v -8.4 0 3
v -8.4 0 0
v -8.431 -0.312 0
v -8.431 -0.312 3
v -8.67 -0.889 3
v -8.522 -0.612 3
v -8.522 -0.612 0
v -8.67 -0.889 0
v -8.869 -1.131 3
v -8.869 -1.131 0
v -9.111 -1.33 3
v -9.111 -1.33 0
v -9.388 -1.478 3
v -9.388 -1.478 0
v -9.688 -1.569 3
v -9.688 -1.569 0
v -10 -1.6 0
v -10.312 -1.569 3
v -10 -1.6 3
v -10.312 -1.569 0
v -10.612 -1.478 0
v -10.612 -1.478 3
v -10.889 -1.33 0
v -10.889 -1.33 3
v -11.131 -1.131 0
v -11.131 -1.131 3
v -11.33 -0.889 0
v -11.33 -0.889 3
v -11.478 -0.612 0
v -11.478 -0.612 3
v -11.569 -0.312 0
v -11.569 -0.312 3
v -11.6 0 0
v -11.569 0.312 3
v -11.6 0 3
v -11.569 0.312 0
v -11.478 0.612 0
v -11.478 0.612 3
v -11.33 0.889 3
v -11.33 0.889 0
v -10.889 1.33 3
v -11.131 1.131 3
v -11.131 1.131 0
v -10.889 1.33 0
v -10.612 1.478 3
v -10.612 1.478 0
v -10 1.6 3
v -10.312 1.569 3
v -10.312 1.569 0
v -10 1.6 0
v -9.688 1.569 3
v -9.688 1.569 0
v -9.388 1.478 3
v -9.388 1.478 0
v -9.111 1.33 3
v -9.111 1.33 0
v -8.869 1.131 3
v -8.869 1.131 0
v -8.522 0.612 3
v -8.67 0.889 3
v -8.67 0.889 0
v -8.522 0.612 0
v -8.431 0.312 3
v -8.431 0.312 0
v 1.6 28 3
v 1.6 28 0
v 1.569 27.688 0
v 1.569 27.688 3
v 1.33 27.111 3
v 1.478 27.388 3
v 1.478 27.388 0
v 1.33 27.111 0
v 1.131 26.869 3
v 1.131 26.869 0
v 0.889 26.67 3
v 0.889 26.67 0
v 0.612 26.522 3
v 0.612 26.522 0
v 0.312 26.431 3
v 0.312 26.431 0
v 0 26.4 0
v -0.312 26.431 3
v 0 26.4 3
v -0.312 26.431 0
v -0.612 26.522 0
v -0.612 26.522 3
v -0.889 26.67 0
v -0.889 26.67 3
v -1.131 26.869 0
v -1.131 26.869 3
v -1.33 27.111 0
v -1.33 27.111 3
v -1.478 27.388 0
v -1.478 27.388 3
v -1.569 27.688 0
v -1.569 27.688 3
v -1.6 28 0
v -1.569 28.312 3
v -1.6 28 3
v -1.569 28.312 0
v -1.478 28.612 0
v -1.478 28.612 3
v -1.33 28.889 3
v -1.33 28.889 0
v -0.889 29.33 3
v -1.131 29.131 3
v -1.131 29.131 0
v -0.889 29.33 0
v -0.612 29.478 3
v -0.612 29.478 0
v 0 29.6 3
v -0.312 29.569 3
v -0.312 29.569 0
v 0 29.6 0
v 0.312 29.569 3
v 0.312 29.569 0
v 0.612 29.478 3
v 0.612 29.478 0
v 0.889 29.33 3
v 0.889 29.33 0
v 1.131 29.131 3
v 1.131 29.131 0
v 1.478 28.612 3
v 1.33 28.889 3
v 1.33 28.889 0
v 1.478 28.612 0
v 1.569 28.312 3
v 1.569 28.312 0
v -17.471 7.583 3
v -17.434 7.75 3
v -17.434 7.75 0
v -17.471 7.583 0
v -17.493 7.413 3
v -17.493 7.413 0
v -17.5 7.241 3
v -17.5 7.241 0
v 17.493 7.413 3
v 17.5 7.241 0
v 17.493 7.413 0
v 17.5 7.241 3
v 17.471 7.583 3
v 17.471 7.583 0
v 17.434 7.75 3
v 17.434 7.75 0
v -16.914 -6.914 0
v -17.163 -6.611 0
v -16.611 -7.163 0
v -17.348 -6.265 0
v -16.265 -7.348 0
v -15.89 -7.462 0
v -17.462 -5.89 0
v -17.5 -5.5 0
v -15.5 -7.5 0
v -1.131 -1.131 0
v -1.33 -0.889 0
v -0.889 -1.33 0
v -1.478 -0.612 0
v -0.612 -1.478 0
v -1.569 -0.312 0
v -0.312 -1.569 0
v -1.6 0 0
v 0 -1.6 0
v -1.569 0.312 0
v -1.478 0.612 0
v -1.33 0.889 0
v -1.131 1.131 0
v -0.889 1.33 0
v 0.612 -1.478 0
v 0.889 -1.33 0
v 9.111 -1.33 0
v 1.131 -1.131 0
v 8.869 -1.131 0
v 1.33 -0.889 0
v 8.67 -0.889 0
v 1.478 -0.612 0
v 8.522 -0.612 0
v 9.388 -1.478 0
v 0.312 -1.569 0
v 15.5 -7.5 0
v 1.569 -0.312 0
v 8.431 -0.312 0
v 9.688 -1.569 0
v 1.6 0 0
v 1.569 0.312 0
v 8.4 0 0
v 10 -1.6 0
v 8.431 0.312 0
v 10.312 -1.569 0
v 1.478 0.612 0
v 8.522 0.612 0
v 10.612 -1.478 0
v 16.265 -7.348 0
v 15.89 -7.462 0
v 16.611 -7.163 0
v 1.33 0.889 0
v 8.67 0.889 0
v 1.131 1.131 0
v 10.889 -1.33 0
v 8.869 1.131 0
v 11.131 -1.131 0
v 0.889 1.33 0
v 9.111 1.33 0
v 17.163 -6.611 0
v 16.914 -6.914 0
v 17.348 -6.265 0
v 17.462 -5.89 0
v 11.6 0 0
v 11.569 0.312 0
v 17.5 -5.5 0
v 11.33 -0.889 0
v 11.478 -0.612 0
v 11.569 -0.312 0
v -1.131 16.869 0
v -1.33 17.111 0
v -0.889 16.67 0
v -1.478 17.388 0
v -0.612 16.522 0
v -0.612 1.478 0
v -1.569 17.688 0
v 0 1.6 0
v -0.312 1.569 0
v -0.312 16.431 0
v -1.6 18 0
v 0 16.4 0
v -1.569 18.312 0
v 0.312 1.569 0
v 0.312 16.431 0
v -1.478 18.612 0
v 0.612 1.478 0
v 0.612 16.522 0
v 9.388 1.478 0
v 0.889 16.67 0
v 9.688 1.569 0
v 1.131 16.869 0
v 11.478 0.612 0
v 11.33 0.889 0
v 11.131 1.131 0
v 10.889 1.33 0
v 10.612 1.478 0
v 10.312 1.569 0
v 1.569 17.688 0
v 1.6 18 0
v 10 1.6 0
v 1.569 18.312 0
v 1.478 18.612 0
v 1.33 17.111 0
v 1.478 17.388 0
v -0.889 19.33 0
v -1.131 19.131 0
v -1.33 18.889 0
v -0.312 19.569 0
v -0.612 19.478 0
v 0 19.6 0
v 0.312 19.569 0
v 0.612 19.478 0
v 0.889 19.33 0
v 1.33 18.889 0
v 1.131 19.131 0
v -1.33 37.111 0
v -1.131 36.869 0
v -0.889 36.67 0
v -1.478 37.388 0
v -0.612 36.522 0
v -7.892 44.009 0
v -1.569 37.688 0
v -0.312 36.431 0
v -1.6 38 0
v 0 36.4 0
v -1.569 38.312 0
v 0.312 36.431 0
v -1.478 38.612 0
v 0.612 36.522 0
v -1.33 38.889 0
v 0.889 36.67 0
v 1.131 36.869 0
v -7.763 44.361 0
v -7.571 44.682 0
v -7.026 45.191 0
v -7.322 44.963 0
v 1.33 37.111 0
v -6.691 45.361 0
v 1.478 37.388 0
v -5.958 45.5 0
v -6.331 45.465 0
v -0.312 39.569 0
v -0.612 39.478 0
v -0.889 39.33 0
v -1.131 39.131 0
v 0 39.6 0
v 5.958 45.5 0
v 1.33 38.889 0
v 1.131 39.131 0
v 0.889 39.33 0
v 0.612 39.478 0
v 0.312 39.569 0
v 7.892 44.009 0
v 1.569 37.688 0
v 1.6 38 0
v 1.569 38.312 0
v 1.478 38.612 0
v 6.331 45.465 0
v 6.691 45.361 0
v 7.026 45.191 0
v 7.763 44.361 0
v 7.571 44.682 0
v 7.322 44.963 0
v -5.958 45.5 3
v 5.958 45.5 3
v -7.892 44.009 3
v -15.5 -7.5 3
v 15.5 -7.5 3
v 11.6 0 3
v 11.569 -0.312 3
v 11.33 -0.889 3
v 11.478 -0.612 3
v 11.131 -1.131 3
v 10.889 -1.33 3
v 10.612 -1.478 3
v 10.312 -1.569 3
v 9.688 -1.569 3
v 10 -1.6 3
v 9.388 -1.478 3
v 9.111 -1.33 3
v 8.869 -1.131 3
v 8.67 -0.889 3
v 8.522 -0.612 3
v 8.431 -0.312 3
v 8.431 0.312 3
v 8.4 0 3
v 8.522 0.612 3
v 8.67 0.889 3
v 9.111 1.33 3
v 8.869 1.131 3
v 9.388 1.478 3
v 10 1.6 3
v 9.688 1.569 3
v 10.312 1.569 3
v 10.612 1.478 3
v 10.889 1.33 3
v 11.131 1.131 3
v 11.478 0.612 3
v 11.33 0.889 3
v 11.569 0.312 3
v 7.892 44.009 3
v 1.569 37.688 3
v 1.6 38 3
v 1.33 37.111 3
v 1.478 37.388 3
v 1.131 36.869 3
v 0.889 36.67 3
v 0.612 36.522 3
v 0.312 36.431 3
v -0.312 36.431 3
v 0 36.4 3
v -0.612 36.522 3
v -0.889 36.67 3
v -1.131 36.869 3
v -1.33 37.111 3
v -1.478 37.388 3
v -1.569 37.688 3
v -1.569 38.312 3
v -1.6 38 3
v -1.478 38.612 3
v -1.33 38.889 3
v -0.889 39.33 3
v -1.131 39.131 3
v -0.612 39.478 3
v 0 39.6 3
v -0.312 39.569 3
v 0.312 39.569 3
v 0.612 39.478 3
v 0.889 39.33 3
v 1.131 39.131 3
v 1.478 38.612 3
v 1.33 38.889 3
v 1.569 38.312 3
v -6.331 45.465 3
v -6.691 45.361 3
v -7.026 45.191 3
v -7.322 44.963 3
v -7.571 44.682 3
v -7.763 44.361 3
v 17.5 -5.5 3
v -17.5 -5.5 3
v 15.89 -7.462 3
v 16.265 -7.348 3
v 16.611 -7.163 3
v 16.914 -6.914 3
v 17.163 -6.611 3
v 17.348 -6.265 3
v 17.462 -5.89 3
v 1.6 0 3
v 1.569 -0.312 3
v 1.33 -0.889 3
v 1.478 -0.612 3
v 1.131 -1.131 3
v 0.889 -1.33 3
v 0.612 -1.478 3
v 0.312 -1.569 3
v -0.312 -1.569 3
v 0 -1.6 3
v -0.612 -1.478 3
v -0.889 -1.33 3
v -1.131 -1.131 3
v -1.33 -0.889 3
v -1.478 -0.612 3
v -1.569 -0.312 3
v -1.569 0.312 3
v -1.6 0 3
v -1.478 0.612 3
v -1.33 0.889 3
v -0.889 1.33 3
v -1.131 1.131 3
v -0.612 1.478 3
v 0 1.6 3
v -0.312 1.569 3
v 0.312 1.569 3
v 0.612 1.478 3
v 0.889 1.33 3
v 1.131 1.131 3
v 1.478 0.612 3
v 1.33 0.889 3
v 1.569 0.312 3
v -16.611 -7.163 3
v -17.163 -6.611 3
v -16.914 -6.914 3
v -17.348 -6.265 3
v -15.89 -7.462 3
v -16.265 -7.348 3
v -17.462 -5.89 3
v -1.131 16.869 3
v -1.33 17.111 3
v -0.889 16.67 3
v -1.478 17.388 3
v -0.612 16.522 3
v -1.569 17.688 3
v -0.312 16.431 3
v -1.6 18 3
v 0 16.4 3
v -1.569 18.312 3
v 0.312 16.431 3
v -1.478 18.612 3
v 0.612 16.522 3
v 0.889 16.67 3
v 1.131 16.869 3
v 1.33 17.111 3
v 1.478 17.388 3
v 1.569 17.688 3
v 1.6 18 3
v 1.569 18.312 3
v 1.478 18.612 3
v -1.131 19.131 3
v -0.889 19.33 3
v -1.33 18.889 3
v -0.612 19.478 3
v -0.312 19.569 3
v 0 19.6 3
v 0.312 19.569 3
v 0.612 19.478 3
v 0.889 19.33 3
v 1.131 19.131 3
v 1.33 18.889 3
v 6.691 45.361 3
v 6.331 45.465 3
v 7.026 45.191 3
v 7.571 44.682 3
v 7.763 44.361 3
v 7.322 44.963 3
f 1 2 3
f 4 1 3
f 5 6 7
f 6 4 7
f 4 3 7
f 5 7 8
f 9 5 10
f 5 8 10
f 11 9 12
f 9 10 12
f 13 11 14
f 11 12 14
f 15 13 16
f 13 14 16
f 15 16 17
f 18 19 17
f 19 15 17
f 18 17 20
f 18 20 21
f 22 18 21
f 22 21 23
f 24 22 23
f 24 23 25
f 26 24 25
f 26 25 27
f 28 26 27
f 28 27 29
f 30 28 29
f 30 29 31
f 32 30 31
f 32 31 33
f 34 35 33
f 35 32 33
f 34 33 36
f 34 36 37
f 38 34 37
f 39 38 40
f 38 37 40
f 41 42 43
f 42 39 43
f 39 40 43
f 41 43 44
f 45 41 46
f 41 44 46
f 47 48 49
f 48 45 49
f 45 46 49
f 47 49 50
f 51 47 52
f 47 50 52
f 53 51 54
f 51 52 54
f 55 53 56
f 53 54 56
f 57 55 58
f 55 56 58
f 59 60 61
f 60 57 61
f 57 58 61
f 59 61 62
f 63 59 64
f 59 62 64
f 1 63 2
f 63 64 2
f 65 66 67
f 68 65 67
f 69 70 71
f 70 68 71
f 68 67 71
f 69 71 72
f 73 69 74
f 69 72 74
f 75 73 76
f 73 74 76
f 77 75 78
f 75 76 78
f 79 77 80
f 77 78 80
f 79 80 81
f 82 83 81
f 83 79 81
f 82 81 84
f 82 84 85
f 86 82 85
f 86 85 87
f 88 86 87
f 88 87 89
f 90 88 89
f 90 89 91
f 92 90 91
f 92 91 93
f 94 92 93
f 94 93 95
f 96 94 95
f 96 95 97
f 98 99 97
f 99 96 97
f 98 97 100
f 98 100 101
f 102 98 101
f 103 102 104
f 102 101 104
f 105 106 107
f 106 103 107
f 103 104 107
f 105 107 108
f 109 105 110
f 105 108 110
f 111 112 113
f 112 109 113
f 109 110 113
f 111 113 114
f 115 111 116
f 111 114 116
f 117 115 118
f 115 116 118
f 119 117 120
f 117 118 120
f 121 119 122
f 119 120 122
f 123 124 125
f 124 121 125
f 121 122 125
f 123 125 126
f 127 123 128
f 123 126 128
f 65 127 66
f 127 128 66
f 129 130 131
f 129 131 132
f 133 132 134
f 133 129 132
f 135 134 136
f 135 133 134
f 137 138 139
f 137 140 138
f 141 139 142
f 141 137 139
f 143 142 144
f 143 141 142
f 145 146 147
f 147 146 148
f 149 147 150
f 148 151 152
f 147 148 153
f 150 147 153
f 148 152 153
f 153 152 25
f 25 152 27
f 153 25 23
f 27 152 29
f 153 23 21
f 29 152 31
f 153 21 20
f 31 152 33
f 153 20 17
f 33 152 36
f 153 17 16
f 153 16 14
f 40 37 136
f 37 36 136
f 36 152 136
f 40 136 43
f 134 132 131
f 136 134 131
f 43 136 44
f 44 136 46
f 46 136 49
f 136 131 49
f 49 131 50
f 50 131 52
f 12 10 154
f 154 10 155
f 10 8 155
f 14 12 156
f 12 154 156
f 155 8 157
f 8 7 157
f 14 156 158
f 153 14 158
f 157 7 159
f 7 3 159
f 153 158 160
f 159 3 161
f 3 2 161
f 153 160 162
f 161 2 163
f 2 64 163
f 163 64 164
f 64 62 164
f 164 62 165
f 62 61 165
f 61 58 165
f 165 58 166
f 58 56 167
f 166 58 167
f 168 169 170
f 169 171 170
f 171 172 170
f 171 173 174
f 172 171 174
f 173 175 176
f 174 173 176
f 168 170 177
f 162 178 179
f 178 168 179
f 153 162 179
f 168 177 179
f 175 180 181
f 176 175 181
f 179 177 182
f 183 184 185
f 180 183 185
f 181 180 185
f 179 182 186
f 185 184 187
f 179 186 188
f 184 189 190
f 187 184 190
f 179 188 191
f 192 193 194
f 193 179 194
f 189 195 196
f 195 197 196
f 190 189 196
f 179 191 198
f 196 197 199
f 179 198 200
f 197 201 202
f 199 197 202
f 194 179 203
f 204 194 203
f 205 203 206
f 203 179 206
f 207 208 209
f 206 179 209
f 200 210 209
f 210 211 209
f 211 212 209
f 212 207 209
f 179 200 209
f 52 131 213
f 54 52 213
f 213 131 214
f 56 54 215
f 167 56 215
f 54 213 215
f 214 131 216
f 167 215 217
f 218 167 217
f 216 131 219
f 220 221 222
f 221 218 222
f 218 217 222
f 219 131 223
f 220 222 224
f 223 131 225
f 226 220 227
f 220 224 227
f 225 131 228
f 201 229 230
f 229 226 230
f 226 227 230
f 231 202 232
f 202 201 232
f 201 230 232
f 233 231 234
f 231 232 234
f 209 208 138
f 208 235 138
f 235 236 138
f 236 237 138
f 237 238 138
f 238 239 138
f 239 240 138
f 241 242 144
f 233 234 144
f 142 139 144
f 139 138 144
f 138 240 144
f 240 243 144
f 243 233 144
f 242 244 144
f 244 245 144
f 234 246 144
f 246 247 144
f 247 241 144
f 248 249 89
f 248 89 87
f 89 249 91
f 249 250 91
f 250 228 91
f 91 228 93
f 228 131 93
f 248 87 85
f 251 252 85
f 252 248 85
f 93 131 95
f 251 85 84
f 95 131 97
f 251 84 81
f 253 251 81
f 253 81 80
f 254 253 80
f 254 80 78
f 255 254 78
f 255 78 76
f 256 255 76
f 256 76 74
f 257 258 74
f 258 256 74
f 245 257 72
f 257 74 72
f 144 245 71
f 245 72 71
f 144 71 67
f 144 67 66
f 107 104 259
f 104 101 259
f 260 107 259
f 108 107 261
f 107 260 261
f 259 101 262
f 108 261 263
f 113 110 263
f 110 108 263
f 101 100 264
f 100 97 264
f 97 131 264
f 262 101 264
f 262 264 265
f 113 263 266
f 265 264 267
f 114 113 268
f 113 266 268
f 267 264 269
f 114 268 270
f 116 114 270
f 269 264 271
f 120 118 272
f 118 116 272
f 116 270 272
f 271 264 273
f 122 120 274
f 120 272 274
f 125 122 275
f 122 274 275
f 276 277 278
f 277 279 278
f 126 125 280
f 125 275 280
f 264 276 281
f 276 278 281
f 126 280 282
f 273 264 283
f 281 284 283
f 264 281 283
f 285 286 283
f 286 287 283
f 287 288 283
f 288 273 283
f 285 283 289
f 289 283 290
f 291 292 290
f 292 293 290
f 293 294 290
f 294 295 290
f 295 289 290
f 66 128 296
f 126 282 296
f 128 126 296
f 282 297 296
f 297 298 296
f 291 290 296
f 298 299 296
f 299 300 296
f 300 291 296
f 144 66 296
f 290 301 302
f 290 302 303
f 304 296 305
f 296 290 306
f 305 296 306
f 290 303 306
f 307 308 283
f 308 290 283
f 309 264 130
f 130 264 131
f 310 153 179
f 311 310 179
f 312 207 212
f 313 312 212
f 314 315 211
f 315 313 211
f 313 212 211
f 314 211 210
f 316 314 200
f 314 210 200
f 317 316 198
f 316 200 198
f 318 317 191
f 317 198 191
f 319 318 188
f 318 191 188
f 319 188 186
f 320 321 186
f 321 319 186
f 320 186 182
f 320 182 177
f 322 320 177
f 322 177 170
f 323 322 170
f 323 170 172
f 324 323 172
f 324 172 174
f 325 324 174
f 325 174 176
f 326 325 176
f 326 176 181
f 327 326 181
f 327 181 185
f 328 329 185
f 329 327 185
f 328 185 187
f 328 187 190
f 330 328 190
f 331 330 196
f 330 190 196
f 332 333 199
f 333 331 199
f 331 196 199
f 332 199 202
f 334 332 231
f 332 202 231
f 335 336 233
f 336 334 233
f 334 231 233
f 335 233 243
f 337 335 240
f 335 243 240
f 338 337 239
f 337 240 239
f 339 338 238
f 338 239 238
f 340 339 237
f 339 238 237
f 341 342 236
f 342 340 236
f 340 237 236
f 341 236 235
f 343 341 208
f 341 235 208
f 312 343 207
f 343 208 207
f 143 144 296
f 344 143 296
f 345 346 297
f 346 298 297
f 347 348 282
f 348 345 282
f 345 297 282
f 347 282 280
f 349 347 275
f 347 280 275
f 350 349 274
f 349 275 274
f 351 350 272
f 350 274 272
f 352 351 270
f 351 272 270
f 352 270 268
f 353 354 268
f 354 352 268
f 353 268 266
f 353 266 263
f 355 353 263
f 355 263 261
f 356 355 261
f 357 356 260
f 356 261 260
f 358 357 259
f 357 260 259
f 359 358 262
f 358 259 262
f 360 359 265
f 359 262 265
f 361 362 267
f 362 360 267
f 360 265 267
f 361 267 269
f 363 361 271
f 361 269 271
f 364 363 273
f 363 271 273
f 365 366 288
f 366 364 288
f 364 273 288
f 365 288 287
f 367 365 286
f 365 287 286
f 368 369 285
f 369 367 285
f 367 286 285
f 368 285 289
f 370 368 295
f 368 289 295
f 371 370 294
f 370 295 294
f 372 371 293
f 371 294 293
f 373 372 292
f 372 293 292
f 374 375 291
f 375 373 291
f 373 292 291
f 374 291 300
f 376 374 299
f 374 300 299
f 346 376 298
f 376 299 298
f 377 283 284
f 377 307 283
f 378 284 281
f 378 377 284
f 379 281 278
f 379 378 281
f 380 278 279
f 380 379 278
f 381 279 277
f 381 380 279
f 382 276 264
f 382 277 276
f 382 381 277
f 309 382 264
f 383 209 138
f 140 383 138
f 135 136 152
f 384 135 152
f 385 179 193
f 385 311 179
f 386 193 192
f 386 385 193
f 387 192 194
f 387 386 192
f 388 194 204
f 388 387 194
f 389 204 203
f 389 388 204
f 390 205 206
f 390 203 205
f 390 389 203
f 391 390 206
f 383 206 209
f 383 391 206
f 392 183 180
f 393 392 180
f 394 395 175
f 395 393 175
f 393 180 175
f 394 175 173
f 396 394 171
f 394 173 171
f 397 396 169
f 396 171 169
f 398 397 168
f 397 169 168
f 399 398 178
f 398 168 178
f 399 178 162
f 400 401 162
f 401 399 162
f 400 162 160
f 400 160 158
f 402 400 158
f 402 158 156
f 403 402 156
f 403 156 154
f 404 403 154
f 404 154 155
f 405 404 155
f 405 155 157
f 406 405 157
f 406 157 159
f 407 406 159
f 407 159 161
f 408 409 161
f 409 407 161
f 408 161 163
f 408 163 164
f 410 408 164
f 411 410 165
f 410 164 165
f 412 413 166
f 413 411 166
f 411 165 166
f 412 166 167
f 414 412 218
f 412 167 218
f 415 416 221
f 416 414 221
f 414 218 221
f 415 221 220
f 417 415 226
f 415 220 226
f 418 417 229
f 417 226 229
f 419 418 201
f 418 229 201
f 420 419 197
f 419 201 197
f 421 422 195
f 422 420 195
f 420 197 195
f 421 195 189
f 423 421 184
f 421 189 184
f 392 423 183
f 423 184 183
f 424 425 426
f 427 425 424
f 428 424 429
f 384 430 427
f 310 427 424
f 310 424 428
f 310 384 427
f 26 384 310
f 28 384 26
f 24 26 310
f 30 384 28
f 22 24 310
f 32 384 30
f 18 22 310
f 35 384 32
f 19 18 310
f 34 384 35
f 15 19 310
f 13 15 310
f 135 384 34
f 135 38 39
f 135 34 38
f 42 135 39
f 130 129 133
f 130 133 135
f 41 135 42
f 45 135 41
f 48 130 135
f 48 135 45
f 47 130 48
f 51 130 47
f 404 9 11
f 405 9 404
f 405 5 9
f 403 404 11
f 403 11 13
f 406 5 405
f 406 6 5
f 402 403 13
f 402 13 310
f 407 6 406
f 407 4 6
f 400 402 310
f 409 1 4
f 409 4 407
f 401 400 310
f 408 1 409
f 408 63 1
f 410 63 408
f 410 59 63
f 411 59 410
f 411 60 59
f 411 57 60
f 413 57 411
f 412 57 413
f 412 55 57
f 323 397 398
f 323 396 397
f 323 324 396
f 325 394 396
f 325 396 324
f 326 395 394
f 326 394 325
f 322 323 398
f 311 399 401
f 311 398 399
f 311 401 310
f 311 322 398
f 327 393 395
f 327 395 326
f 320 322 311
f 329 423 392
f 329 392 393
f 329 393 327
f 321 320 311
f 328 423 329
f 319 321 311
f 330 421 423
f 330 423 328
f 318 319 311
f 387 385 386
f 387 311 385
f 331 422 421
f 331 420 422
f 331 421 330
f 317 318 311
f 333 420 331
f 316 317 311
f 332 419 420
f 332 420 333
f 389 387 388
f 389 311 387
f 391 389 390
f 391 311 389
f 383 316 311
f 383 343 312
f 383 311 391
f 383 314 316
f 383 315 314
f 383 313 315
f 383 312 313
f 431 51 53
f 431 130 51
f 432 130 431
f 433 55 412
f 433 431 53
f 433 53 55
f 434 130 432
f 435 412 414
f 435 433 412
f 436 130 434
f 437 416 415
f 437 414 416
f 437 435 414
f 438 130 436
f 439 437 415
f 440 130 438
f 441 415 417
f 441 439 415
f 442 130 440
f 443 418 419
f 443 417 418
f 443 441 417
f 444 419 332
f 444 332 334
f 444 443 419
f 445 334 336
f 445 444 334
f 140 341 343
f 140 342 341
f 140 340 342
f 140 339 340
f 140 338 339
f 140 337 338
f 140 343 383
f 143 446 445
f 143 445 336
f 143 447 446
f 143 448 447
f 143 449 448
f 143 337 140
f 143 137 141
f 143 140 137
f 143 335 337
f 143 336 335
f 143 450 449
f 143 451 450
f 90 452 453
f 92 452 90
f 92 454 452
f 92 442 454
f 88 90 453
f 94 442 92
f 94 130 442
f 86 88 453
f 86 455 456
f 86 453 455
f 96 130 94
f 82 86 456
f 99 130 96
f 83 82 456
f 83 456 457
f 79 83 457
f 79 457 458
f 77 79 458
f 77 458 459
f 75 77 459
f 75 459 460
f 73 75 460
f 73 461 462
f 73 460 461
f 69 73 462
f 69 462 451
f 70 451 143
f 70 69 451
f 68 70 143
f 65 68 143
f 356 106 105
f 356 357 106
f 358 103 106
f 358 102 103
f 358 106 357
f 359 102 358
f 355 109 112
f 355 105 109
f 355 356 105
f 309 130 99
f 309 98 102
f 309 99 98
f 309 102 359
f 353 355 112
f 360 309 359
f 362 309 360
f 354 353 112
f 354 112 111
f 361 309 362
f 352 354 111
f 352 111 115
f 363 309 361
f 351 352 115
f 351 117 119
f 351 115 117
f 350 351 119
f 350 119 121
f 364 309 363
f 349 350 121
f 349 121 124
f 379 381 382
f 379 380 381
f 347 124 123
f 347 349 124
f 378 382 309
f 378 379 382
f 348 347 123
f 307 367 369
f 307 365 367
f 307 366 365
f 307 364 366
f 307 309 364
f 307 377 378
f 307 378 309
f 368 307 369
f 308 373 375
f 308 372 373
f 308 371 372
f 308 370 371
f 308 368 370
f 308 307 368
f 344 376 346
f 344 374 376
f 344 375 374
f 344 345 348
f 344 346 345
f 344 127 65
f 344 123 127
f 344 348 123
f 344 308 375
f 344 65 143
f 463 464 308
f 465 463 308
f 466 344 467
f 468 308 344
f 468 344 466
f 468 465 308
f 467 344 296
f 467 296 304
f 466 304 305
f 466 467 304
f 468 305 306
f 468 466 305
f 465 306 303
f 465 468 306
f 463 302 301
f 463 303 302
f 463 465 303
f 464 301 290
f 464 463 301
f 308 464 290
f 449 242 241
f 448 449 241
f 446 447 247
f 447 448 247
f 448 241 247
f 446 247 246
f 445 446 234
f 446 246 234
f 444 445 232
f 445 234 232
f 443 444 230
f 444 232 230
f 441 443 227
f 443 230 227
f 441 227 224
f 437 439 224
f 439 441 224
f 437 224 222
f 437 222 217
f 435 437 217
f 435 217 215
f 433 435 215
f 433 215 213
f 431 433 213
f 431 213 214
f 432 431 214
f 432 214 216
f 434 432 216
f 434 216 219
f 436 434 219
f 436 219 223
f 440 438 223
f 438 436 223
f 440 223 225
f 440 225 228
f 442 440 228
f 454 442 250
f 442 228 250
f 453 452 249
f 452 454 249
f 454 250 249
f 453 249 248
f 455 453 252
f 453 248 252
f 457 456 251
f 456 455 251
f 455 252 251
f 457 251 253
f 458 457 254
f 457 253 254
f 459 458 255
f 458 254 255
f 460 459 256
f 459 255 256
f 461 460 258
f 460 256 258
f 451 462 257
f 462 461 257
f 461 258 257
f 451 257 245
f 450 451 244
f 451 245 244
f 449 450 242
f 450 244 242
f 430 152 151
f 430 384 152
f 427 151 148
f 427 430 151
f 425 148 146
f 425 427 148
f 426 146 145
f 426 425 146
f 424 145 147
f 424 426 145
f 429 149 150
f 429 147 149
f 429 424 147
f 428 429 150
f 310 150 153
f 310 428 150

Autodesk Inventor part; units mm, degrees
ref_plane "YZ Plane" through (0, 0, 0) normal (1, 0, 0) x (0, 1, 0)
ref_plane "XZ Plane" through (0, 0, 0) normal (0, 1, 0) x (-1, 0, 0)
ref_plane "XY Plane" through (0, 0, 0) normal (0, 0, 1) x (1, 0, 0)
sketch "スケッチ1" plane through (0, 0, 0) normal (0, 0, 1) x (1, 0, 0)
  circle A0 centre (0, 0) radius 1.6
  circle A1 centre (10, 0) radius 1.6
  circle A2 centre (-10, 0) radius 1.6
  circle A3 centre (0, 18) radius 1.6
  circle A4 centre (0, 38) radius 1.6
  circle A5 centre (0, 28) radius 1.6
  line L0 (-17.5, 7.5) -> (-17.5, -7.5)
  line L1 (-17.5, -7.5) -> (17.5, -7.5)
  line L2 (17.5, -7.5) -> (17.5, 7.5)
  line L3 (17.5, 7.5) -> (7.5, 45.5)
  line L4 (7.5, 45.5) -> (-7.5, 45.5)
  line L5 (-7.5, 45.5) -> (-17.5, 7.5)
  dimension "d0" = 3.2
  dimension "d1" = 3.2
  dimension "d2" = 3.2
  dimension "d3" = 10
  dimension "d4" = 10
  dimension "d5" = 3.2
  dimension "d6" = 3.2
  dimension "d7" = 3.2
  dimension "d8" = 18
  dimension "d9" = 10
  dimension "d10" = 10
  dimension "d11" = 7.5
  dimension "d12" = 7.5
  dimension "d13" = 7.5
  dimension "d14" = 7.5
  dimension "d15" = 7.5
  dimension "d16" = 7.5
  dimension "d17" = 7.5
extrude "押し出し1" add sketch "スケッチ1" along normal blind 3
fillet "フィレット1" radius 2 6 edges at (-7.5, 45.5, 1.5) (7.5, 45.5, 1.5) (17.5, 7.5, 1.5) (17.5, -7.5, 1.5) (-17.5, -7.5, 1.5) (-17.5, 7.5, 1.5)
properties part number "オムニ_固定具5" material "アルミニウム 6061"
